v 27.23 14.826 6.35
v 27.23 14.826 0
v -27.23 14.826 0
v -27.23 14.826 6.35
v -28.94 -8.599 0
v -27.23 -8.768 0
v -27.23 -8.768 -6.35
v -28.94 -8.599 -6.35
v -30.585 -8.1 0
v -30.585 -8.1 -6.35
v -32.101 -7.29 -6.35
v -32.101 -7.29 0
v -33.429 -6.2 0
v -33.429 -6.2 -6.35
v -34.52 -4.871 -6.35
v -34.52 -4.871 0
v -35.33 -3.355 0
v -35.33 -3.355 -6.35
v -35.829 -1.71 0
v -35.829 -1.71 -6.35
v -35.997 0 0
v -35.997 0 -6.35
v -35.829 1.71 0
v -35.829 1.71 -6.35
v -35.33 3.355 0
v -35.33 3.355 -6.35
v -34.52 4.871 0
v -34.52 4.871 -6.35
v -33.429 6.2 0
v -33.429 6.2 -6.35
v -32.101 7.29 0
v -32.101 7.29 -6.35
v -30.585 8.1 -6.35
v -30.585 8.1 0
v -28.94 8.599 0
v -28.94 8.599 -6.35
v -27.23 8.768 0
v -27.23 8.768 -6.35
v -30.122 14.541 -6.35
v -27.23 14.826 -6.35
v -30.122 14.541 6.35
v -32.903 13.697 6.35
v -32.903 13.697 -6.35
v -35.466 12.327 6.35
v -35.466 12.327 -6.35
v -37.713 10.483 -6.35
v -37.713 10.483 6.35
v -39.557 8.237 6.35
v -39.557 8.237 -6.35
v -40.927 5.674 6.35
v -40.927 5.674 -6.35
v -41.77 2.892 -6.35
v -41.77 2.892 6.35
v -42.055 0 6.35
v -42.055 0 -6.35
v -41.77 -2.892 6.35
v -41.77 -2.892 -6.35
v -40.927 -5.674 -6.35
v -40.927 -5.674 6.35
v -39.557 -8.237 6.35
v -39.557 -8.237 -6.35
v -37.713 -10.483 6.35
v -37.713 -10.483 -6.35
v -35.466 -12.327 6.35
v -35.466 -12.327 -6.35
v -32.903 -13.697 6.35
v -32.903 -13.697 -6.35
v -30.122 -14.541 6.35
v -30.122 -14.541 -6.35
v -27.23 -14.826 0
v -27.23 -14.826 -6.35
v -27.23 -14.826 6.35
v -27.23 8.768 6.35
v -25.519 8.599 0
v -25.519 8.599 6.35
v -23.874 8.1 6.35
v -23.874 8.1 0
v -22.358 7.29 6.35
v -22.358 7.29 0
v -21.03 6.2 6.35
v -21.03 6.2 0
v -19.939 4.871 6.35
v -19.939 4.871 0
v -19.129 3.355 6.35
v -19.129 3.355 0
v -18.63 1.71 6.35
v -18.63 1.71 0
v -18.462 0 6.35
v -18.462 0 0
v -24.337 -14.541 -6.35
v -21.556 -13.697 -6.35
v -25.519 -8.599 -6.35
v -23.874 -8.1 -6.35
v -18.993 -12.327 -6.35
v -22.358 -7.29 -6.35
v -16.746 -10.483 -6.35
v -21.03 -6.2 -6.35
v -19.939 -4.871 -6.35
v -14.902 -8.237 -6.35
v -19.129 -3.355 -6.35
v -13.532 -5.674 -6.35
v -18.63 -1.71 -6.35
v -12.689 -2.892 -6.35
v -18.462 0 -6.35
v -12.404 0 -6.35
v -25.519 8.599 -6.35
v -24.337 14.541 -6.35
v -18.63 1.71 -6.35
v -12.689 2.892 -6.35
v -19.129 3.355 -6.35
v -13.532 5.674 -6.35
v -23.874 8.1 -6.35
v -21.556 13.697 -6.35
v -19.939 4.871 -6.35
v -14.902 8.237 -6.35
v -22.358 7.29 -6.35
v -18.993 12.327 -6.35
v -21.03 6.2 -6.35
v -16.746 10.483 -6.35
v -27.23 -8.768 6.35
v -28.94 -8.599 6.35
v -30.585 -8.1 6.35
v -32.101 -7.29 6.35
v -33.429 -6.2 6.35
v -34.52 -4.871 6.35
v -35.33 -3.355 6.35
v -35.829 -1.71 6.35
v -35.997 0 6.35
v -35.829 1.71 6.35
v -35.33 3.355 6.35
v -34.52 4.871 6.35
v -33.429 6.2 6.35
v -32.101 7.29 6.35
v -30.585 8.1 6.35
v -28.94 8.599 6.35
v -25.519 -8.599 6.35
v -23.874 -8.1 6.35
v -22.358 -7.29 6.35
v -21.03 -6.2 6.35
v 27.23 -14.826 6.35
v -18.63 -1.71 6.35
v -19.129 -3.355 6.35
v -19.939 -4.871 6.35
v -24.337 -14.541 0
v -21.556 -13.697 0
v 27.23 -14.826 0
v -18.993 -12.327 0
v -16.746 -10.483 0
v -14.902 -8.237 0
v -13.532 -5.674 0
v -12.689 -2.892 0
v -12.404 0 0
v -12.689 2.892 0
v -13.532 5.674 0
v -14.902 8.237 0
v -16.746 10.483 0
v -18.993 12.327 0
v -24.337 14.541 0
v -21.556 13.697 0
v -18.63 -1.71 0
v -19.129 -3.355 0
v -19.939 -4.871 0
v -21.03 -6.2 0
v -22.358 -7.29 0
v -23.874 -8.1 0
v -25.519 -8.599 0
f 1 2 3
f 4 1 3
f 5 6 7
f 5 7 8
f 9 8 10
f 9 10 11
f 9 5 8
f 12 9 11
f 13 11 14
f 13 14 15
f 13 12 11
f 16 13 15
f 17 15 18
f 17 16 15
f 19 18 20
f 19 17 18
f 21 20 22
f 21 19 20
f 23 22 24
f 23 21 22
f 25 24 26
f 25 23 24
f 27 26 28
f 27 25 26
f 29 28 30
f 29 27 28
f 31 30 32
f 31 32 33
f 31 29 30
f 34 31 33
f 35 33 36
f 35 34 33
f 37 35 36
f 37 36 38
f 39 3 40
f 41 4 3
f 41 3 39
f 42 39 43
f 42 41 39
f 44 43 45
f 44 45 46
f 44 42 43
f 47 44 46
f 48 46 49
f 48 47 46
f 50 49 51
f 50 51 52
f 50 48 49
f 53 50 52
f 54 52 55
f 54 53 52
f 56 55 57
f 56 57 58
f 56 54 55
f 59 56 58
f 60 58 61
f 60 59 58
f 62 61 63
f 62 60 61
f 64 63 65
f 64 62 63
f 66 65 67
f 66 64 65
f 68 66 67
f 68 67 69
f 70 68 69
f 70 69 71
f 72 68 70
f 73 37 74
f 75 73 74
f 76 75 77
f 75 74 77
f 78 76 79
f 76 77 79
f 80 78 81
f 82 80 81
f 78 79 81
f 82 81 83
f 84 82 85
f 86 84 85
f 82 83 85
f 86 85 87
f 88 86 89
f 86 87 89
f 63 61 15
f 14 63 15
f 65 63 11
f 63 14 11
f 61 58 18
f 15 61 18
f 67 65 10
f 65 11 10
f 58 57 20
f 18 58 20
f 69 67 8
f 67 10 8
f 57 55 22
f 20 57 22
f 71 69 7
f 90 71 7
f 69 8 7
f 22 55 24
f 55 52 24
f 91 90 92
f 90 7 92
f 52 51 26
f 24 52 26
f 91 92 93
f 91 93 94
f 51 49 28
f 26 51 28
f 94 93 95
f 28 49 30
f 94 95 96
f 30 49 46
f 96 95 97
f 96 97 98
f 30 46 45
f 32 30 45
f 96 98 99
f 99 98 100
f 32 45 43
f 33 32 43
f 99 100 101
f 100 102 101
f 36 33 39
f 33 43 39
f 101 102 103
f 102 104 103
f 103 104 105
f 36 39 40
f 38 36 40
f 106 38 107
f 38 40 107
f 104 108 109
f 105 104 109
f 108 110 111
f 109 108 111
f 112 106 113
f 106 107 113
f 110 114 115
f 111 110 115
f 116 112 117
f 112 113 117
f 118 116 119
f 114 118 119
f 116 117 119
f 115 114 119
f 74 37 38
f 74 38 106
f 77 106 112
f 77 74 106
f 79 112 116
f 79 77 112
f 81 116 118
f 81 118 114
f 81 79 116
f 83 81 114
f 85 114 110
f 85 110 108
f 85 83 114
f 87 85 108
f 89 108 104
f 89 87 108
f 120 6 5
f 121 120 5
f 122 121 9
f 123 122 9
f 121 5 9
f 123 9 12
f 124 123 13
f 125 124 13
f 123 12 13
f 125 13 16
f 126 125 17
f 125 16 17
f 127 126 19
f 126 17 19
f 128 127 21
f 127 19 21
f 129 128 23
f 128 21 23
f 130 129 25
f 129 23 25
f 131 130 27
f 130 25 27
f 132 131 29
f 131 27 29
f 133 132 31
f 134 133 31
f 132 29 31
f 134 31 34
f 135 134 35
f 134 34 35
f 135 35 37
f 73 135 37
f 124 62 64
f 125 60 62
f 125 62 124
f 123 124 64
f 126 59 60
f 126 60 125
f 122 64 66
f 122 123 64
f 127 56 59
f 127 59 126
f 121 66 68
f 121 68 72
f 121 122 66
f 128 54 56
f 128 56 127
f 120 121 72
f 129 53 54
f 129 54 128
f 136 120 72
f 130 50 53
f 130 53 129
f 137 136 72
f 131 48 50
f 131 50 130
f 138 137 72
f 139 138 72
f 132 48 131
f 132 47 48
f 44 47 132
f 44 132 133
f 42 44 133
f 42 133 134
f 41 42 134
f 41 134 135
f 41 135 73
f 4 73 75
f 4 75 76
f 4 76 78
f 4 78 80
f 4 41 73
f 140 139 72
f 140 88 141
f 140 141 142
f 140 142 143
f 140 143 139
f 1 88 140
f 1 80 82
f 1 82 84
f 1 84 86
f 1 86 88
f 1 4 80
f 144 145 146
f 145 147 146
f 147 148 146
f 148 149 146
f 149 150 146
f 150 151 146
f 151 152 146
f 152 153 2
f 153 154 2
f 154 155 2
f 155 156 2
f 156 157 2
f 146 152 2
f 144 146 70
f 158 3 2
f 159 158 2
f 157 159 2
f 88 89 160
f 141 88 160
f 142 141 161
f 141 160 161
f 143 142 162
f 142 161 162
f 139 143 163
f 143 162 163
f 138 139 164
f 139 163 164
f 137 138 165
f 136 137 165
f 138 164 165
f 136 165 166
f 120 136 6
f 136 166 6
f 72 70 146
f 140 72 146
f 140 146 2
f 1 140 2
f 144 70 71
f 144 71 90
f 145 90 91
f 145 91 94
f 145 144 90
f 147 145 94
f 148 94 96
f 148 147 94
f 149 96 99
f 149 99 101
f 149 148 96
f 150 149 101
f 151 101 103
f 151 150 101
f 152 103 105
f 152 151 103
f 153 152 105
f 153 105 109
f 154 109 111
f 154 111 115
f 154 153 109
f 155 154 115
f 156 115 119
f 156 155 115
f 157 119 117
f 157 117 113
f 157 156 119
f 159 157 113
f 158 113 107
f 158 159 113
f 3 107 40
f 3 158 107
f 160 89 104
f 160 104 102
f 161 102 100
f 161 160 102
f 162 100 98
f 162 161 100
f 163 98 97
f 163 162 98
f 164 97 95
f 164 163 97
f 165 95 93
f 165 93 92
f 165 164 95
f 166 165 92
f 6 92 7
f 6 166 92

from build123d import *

# Parameters (mm, degrees)
F1_DEPTH = 6.35
F2_DEPTH = 6.35


with BuildPart() as f1:
    # F0 (on Top) → F1 (new body)
    with BuildSketch(Plane.XY):
        with BuildLine():
            ThreePointArc((-12.4036967908, 0), (-16.7460770157, 10.483433232), (-27.2295102477, 14.8258134569))
            Line((-27.2295102477, 14.8258134569), (-27.2295102477, 8.7676478071))
            ThreePointArc((-27.2295102477, 8.7676478071), (-21.0298470283, 6.1996632194), (-18.4618624406, 0))
            ThreePointArc((-18.4618624406, 0), (-21.0298470283, -6.1996632194), (-27.2295102477, -8.7676478071))
            Line((-27.2295102477, -8.7676478071), (-27.2295102477, -14.8258134569))
            ThreePointArc((-27.2295102477, -14.8258134569), (-16.7460770157, -10.483433232), (-12.4036967908, 0))
        make_face()
        with BuildLine():
            Line((27.2295102477, 14.8258134569), (-27.2295102477, 14.8258134569))
            ThreePointArc((-27.2295102477, 14.8258134569), (-16.7460770157, 10.483433232), (-12.4036967908, 0))
            ThreePointArc((-12.4036967908, 0), (-16.7460770157, -10.483433232), (-27.2295102477, -14.8258134569))
            Line((-27.2295102477, -14.8258134569), (27.2295102477, -14.8258134569))
            Line((27.2295102477, -14.8258134569), (27.2295102477, 14.8258134569))
        make_face()
        with BuildLine():
            Line((-27.2295102477, 8.7676478071), (-27.2295102477, 14.8258134569))
            ThreePointArc((-27.2295102477, 14.8258134569), (-42.0553237046, 0), (-27.2295102477, -14.8258134569))
            Line((-27.2295102477, -14.8258134569), (-27.2295102477, -8.7676478071))
            ThreePointArc((-27.2295102477, -8.7676478071), (-35.9971580548, 0), (-27.2295102477, 8.7676478071))
        make_face()
    extrude(amount=F1_DEPTH)

    # F0 (on Top) → F2 (join)
    with BuildSketch(Plane.XY):
        with BuildLine():
            Line((-27.2295102477, 8.7676478071), (-27.2295102477, 14.8258134569))
            ThreePointArc((-27.2295102477, 14.8258134569), (-42.0553237046, 0), (-27.2295102477, -14.8258134569))
            Line((-27.2295102477, -14.8258134569), (-27.2295102477, -8.7676478071))
            ThreePointArc((-27.2295102477, -8.7676478071), (-35.9971580548, 0), (-27.2295102477, 8.7676478071))
        make_face()
        with BuildLine():
            ThreePointArc((-12.4036967908, 0), (-16.7460770157, 10.483433232), (-27.2295102477, 14.8258134569))
            Line((-27.2295102477, 14.8258134569), (-27.2295102477, 8.7676478071))
            ThreePointArc((-27.2295102477, 8.7676478071), (-21.0298470283, 6.1996632194), (-18.4618624406, 0))
            ThreePointArc((-18.4618624406, 0), (-21.0298470283, -6.1996632194), (-27.2295102477, -8.7676478071))
            Line((-27.2295102477, -8.7676478071), (-27.2295102477, -14.8258134569))
            ThreePointArc((-27.2295102477, -14.8258134569), (-16.7460770157, -10.483433232), (-12.4036967908, 0))
        make_face()
    extrude(amount=-F2_DEPTH)


solid = f1.part
